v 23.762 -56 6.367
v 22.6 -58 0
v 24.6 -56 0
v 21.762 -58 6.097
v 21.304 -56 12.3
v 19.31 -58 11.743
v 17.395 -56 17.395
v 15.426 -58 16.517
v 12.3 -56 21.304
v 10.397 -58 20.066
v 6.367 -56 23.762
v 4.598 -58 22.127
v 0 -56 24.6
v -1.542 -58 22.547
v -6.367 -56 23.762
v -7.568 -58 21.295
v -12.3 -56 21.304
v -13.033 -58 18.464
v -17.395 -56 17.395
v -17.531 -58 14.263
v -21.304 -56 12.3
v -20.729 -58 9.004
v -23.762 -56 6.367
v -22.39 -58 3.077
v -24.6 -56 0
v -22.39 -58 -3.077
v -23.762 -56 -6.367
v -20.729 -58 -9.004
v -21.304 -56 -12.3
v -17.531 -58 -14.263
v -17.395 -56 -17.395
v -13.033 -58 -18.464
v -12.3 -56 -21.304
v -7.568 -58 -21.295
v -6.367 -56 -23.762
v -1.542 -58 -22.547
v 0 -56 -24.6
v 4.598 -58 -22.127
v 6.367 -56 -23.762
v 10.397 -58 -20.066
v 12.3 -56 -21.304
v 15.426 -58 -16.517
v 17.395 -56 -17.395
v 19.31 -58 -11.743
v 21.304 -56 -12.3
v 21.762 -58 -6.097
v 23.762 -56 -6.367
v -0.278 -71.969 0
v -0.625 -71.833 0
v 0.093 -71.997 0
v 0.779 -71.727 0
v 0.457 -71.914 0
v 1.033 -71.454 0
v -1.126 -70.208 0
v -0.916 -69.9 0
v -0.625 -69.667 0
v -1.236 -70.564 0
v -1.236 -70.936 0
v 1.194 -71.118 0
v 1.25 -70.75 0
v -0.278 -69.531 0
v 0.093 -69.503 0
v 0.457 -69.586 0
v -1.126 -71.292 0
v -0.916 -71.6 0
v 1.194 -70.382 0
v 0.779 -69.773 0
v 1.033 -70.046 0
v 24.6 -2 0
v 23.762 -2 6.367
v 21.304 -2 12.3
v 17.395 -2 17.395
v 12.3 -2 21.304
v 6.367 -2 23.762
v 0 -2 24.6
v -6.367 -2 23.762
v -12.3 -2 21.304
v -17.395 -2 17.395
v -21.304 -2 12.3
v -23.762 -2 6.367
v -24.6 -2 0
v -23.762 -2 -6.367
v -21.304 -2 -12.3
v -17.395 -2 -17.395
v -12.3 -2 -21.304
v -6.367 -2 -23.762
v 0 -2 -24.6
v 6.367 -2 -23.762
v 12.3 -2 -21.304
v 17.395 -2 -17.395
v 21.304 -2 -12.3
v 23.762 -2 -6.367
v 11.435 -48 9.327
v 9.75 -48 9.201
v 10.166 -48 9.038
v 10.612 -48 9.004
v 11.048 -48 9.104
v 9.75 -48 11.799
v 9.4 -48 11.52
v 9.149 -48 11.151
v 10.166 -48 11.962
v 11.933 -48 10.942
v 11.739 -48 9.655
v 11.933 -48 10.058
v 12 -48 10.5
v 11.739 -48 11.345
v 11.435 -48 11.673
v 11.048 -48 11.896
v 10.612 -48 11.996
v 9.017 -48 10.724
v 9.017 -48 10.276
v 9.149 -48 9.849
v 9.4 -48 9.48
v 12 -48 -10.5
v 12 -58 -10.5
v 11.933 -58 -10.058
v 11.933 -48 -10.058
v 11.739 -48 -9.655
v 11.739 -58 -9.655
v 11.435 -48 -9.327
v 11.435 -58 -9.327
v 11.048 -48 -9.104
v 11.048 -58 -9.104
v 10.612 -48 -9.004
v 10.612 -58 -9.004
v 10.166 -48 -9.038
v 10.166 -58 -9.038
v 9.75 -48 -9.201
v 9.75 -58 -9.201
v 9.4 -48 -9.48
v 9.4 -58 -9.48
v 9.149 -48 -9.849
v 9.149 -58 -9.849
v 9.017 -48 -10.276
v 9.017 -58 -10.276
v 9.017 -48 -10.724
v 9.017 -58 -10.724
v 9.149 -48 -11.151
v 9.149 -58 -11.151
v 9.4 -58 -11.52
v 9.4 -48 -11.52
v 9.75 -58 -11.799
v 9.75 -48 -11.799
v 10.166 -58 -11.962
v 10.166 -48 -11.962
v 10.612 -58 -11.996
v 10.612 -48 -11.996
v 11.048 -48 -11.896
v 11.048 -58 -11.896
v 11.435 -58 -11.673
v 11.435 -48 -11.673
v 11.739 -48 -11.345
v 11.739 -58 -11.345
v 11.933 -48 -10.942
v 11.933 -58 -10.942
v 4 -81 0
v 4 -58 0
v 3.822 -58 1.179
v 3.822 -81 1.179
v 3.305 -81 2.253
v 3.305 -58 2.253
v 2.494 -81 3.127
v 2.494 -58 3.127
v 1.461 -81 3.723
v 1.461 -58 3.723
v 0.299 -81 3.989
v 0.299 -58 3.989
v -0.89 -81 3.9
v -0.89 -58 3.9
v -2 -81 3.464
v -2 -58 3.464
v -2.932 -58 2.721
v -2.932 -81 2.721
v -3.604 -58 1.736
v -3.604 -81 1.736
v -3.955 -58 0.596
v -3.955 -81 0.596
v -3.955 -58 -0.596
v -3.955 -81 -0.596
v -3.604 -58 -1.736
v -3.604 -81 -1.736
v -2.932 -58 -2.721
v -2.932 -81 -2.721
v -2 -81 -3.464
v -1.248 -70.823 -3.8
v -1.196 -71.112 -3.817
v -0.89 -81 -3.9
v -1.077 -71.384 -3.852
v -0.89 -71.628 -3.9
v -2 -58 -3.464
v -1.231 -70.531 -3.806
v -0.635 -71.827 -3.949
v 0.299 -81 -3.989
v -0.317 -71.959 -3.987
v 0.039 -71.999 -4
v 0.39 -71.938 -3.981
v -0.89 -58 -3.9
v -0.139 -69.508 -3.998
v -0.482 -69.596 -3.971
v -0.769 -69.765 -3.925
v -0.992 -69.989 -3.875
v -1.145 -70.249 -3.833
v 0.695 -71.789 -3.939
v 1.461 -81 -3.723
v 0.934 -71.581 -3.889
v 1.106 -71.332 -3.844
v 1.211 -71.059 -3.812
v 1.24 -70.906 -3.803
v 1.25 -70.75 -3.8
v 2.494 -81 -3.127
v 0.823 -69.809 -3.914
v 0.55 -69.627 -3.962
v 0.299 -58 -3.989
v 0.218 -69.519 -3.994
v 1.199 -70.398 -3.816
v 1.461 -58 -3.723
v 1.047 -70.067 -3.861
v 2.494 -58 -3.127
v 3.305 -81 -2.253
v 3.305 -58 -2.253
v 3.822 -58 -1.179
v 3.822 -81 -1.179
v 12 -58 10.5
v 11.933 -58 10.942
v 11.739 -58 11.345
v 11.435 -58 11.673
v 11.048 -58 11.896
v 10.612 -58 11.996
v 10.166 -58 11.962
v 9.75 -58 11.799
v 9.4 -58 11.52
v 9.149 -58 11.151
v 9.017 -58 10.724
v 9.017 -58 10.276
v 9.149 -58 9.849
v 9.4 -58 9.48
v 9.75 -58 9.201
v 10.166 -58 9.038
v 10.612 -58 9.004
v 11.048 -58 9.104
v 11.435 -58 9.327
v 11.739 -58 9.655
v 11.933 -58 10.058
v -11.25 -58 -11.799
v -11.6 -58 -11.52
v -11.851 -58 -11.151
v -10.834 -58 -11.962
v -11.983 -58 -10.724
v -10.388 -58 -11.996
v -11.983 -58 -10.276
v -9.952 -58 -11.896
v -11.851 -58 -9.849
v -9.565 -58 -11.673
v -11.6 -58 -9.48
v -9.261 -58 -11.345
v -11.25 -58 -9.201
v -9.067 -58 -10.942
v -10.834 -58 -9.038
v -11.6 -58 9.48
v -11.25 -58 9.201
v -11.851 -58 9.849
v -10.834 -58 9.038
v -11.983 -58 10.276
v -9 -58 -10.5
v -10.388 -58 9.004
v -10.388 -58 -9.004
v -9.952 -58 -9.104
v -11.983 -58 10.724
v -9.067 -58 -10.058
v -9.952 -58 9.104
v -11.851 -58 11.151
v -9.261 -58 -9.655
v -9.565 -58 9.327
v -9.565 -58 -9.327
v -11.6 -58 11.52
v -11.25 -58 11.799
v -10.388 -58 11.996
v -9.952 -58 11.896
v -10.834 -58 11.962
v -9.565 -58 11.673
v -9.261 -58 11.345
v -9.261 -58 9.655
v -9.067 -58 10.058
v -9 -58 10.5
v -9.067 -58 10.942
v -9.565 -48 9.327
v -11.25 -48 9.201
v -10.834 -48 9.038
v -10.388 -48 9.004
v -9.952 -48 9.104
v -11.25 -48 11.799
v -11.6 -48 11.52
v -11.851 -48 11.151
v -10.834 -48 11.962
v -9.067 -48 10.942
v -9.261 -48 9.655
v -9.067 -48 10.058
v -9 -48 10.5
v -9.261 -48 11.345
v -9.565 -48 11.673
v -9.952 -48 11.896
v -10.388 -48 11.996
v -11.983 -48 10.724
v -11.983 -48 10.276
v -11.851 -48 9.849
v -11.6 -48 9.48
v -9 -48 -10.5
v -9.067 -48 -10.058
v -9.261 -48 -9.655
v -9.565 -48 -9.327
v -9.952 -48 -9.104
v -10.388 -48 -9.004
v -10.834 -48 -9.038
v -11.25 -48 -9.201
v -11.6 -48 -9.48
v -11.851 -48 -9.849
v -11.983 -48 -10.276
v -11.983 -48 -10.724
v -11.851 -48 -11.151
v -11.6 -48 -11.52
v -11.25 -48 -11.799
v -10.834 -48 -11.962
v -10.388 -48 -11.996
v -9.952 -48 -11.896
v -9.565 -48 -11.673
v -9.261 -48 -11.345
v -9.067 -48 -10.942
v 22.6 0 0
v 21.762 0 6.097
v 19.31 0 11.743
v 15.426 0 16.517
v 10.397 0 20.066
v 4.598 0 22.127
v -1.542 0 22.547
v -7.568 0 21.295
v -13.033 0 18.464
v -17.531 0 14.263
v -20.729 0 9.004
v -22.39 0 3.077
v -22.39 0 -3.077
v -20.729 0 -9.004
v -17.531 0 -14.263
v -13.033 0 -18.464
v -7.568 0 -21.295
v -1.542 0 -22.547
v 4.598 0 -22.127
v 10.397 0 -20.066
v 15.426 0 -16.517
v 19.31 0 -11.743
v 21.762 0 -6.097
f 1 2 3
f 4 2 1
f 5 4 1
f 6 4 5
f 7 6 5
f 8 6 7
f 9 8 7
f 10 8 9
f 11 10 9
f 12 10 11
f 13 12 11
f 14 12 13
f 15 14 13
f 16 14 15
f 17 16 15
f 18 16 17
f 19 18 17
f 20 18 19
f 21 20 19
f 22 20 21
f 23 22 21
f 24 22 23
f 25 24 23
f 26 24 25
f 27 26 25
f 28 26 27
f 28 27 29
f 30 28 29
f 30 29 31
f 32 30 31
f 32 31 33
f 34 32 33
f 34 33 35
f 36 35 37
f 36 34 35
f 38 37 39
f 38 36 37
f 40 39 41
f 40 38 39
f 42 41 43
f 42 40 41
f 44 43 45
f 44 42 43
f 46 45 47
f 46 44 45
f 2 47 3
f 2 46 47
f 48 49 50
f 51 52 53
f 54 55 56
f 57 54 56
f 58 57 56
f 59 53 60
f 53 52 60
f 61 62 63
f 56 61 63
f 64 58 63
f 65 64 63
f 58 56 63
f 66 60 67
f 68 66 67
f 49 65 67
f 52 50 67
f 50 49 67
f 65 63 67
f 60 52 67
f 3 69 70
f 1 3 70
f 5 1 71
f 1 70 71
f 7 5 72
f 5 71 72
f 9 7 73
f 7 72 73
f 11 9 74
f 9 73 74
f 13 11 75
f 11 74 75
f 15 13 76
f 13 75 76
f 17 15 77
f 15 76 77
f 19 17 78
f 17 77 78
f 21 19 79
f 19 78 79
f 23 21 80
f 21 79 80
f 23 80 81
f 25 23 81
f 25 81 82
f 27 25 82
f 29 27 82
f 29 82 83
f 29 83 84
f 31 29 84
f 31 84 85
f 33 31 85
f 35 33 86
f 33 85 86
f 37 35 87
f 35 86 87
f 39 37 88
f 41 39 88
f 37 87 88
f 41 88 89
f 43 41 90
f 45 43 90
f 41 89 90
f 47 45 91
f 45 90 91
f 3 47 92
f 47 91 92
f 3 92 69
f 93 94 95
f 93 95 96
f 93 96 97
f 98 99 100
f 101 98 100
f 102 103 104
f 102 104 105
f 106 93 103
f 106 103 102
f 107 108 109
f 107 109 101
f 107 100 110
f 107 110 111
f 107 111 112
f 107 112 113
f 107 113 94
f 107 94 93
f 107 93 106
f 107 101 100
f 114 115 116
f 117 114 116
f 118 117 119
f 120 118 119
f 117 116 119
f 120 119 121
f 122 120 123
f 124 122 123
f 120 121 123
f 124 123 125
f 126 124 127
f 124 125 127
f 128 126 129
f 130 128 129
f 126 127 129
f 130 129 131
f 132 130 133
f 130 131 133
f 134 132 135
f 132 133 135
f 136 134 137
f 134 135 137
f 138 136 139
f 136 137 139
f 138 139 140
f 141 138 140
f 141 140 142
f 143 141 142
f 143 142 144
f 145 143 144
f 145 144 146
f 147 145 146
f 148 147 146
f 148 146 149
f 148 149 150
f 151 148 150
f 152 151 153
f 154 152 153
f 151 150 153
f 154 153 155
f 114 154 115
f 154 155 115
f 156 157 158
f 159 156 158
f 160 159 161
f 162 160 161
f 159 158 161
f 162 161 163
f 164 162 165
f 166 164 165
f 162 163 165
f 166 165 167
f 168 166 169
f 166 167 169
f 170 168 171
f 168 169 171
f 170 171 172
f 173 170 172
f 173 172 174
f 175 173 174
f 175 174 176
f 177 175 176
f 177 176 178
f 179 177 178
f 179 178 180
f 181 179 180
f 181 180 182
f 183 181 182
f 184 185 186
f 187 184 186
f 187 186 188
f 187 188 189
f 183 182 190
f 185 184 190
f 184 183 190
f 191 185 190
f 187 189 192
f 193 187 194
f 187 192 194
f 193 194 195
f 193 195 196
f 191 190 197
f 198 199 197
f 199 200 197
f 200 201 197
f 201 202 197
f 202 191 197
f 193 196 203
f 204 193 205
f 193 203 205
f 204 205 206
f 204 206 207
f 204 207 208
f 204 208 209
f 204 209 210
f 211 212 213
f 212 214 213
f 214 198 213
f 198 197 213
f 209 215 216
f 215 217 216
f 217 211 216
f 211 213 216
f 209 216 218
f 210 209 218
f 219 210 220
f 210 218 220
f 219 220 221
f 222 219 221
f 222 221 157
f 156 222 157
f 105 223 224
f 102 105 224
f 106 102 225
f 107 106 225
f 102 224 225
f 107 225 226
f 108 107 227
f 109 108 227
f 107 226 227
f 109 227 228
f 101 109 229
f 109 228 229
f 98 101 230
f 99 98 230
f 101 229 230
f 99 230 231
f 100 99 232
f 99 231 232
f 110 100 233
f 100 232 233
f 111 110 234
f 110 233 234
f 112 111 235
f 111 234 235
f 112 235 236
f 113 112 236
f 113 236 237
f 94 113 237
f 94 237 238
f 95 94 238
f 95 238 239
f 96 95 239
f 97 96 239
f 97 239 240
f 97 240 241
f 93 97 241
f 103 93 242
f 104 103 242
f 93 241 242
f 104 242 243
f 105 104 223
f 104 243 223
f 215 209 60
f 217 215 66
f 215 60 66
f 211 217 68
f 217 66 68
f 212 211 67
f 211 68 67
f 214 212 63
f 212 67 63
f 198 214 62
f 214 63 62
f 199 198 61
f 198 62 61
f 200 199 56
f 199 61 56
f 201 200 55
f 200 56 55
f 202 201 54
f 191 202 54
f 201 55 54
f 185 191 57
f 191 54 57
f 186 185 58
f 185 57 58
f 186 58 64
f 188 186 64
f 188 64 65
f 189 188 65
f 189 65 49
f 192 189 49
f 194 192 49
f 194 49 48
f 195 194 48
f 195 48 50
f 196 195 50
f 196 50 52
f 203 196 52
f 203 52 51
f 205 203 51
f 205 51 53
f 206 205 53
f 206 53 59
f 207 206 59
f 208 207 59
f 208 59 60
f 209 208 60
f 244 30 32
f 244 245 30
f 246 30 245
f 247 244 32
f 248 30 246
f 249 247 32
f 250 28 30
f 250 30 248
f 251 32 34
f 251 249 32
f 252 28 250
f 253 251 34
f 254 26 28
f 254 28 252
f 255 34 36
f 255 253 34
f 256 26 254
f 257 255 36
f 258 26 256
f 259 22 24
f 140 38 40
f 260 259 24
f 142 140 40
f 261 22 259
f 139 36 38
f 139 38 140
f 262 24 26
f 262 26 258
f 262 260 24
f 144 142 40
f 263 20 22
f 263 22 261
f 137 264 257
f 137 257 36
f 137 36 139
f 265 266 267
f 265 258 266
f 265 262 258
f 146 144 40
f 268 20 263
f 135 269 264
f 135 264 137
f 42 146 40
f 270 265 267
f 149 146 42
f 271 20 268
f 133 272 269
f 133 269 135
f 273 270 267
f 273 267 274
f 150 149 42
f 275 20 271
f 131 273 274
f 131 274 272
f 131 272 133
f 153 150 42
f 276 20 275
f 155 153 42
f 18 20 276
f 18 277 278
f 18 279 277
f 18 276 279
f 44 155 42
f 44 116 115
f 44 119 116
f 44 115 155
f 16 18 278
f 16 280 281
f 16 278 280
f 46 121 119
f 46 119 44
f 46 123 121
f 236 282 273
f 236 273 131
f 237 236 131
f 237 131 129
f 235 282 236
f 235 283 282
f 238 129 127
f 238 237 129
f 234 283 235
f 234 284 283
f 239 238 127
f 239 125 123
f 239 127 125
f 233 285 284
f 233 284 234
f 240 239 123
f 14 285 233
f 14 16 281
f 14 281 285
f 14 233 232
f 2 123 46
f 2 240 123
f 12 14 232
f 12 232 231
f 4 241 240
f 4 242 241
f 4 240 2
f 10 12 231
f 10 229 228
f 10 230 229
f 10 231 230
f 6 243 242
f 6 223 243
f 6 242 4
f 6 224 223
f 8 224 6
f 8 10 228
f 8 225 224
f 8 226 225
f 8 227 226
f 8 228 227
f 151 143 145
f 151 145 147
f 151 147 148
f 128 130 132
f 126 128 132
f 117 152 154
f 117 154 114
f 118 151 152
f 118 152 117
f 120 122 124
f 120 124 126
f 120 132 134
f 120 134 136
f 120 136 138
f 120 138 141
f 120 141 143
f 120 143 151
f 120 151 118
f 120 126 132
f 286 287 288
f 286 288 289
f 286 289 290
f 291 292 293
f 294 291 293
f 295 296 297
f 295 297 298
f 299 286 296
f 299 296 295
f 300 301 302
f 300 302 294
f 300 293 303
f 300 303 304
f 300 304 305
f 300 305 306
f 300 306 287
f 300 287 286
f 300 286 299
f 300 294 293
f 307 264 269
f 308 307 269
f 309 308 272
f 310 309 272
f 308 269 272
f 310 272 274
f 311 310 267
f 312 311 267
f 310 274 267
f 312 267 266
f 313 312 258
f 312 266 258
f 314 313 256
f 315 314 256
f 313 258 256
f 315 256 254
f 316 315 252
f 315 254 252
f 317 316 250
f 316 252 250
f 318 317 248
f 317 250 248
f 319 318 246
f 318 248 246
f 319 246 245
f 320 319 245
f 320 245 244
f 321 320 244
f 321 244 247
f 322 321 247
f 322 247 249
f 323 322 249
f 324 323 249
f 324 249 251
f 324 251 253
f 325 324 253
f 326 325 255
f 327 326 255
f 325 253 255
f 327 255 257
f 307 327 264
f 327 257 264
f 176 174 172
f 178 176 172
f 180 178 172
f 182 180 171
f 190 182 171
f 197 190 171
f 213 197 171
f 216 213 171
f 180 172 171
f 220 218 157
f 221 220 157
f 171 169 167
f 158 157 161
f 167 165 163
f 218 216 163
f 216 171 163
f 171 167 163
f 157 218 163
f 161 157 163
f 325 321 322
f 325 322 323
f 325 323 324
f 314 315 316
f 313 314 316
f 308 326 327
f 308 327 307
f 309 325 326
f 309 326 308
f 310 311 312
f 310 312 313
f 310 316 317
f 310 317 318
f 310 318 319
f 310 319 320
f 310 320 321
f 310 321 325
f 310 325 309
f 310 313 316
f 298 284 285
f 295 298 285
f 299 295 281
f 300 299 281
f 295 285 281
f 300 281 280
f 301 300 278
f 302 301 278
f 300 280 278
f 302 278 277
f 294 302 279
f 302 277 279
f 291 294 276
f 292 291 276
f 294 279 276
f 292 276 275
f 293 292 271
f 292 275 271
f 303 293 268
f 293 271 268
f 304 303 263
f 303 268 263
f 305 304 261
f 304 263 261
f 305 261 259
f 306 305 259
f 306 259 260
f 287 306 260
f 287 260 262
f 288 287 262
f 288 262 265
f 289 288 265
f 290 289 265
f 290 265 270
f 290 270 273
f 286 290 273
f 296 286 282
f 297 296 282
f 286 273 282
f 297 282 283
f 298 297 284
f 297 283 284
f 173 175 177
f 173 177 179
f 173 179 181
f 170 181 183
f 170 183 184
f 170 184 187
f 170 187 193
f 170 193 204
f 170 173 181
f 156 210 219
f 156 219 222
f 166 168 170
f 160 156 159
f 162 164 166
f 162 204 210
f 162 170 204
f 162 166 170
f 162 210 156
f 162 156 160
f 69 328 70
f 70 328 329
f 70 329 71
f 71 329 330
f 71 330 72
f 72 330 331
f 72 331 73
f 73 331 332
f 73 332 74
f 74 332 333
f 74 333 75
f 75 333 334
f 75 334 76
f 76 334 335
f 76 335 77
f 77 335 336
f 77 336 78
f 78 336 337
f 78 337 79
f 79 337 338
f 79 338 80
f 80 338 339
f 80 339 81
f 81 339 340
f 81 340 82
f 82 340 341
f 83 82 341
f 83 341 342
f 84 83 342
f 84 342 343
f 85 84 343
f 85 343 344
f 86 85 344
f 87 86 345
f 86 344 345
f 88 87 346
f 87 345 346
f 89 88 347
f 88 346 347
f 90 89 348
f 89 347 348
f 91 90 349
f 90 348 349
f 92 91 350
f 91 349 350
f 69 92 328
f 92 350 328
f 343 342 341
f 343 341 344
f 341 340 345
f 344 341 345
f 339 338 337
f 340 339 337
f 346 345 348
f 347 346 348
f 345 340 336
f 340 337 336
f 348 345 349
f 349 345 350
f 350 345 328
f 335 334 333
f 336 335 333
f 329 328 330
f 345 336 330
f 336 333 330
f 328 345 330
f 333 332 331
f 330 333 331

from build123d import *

# Parameters (mm, degrees)
F0_R     = 24.6
F1_DEPTH = 58
F2_R     = 4
F3_DEPTH = 23
F4_R     = 1.5
F5_DEPTH = 10
F6_SIZE  = 2
F7_R     = 1.25
F8_DEPTH = 4


with BuildPart() as f1:
    # F0 (on Front) → F1 (new body)
    with BuildSketch(Plane.XZ):
        Circle(F0_R)
    extrude(amount=F1_DEPTH)

    # F4 (on face) → F5 (cut)
    with BuildSketch(Plane.XZ.offset(58)):
        with Locations((10.5, 10.5)):
            Circle(F4_R)
        with Locations((10.5, -10.5)):
            Circle(F4_R)
        with Locations((-10.5, -10.5)):
            Circle(F4_R)
        with Locations((-10.5, 10.5)):
            Circle(F4_R)
    extrude(amount=-F5_DEPTH, mode=Mode.SUBTRACT)

    # F6
    f6_edges = [f1.edges().sort_by_distance(p)[0] for p in [
        (-24.6, 0, 0),
        (-24.6, -58, 0),
    ]]
    chamfer(f6_edges, length=F6_SIZE)


with BuildPart() as f3:
    # F2 (on face) → F3 (new body)
    with BuildSketch(Plane.XZ.offset(58)):
        Circle(F2_R)
    extrude(amount=F3_DEPTH)

    # F7 (on Top) → F8 (cut)
    with BuildSketch(Plane.XY):
        with Locations((0, -70.75)):
            Circle(F7_R)
    extrude(amount=-F8_DEPTH, mode=Mode.SUBTRACT)


solid = Compound([f1.part, f3.part])
